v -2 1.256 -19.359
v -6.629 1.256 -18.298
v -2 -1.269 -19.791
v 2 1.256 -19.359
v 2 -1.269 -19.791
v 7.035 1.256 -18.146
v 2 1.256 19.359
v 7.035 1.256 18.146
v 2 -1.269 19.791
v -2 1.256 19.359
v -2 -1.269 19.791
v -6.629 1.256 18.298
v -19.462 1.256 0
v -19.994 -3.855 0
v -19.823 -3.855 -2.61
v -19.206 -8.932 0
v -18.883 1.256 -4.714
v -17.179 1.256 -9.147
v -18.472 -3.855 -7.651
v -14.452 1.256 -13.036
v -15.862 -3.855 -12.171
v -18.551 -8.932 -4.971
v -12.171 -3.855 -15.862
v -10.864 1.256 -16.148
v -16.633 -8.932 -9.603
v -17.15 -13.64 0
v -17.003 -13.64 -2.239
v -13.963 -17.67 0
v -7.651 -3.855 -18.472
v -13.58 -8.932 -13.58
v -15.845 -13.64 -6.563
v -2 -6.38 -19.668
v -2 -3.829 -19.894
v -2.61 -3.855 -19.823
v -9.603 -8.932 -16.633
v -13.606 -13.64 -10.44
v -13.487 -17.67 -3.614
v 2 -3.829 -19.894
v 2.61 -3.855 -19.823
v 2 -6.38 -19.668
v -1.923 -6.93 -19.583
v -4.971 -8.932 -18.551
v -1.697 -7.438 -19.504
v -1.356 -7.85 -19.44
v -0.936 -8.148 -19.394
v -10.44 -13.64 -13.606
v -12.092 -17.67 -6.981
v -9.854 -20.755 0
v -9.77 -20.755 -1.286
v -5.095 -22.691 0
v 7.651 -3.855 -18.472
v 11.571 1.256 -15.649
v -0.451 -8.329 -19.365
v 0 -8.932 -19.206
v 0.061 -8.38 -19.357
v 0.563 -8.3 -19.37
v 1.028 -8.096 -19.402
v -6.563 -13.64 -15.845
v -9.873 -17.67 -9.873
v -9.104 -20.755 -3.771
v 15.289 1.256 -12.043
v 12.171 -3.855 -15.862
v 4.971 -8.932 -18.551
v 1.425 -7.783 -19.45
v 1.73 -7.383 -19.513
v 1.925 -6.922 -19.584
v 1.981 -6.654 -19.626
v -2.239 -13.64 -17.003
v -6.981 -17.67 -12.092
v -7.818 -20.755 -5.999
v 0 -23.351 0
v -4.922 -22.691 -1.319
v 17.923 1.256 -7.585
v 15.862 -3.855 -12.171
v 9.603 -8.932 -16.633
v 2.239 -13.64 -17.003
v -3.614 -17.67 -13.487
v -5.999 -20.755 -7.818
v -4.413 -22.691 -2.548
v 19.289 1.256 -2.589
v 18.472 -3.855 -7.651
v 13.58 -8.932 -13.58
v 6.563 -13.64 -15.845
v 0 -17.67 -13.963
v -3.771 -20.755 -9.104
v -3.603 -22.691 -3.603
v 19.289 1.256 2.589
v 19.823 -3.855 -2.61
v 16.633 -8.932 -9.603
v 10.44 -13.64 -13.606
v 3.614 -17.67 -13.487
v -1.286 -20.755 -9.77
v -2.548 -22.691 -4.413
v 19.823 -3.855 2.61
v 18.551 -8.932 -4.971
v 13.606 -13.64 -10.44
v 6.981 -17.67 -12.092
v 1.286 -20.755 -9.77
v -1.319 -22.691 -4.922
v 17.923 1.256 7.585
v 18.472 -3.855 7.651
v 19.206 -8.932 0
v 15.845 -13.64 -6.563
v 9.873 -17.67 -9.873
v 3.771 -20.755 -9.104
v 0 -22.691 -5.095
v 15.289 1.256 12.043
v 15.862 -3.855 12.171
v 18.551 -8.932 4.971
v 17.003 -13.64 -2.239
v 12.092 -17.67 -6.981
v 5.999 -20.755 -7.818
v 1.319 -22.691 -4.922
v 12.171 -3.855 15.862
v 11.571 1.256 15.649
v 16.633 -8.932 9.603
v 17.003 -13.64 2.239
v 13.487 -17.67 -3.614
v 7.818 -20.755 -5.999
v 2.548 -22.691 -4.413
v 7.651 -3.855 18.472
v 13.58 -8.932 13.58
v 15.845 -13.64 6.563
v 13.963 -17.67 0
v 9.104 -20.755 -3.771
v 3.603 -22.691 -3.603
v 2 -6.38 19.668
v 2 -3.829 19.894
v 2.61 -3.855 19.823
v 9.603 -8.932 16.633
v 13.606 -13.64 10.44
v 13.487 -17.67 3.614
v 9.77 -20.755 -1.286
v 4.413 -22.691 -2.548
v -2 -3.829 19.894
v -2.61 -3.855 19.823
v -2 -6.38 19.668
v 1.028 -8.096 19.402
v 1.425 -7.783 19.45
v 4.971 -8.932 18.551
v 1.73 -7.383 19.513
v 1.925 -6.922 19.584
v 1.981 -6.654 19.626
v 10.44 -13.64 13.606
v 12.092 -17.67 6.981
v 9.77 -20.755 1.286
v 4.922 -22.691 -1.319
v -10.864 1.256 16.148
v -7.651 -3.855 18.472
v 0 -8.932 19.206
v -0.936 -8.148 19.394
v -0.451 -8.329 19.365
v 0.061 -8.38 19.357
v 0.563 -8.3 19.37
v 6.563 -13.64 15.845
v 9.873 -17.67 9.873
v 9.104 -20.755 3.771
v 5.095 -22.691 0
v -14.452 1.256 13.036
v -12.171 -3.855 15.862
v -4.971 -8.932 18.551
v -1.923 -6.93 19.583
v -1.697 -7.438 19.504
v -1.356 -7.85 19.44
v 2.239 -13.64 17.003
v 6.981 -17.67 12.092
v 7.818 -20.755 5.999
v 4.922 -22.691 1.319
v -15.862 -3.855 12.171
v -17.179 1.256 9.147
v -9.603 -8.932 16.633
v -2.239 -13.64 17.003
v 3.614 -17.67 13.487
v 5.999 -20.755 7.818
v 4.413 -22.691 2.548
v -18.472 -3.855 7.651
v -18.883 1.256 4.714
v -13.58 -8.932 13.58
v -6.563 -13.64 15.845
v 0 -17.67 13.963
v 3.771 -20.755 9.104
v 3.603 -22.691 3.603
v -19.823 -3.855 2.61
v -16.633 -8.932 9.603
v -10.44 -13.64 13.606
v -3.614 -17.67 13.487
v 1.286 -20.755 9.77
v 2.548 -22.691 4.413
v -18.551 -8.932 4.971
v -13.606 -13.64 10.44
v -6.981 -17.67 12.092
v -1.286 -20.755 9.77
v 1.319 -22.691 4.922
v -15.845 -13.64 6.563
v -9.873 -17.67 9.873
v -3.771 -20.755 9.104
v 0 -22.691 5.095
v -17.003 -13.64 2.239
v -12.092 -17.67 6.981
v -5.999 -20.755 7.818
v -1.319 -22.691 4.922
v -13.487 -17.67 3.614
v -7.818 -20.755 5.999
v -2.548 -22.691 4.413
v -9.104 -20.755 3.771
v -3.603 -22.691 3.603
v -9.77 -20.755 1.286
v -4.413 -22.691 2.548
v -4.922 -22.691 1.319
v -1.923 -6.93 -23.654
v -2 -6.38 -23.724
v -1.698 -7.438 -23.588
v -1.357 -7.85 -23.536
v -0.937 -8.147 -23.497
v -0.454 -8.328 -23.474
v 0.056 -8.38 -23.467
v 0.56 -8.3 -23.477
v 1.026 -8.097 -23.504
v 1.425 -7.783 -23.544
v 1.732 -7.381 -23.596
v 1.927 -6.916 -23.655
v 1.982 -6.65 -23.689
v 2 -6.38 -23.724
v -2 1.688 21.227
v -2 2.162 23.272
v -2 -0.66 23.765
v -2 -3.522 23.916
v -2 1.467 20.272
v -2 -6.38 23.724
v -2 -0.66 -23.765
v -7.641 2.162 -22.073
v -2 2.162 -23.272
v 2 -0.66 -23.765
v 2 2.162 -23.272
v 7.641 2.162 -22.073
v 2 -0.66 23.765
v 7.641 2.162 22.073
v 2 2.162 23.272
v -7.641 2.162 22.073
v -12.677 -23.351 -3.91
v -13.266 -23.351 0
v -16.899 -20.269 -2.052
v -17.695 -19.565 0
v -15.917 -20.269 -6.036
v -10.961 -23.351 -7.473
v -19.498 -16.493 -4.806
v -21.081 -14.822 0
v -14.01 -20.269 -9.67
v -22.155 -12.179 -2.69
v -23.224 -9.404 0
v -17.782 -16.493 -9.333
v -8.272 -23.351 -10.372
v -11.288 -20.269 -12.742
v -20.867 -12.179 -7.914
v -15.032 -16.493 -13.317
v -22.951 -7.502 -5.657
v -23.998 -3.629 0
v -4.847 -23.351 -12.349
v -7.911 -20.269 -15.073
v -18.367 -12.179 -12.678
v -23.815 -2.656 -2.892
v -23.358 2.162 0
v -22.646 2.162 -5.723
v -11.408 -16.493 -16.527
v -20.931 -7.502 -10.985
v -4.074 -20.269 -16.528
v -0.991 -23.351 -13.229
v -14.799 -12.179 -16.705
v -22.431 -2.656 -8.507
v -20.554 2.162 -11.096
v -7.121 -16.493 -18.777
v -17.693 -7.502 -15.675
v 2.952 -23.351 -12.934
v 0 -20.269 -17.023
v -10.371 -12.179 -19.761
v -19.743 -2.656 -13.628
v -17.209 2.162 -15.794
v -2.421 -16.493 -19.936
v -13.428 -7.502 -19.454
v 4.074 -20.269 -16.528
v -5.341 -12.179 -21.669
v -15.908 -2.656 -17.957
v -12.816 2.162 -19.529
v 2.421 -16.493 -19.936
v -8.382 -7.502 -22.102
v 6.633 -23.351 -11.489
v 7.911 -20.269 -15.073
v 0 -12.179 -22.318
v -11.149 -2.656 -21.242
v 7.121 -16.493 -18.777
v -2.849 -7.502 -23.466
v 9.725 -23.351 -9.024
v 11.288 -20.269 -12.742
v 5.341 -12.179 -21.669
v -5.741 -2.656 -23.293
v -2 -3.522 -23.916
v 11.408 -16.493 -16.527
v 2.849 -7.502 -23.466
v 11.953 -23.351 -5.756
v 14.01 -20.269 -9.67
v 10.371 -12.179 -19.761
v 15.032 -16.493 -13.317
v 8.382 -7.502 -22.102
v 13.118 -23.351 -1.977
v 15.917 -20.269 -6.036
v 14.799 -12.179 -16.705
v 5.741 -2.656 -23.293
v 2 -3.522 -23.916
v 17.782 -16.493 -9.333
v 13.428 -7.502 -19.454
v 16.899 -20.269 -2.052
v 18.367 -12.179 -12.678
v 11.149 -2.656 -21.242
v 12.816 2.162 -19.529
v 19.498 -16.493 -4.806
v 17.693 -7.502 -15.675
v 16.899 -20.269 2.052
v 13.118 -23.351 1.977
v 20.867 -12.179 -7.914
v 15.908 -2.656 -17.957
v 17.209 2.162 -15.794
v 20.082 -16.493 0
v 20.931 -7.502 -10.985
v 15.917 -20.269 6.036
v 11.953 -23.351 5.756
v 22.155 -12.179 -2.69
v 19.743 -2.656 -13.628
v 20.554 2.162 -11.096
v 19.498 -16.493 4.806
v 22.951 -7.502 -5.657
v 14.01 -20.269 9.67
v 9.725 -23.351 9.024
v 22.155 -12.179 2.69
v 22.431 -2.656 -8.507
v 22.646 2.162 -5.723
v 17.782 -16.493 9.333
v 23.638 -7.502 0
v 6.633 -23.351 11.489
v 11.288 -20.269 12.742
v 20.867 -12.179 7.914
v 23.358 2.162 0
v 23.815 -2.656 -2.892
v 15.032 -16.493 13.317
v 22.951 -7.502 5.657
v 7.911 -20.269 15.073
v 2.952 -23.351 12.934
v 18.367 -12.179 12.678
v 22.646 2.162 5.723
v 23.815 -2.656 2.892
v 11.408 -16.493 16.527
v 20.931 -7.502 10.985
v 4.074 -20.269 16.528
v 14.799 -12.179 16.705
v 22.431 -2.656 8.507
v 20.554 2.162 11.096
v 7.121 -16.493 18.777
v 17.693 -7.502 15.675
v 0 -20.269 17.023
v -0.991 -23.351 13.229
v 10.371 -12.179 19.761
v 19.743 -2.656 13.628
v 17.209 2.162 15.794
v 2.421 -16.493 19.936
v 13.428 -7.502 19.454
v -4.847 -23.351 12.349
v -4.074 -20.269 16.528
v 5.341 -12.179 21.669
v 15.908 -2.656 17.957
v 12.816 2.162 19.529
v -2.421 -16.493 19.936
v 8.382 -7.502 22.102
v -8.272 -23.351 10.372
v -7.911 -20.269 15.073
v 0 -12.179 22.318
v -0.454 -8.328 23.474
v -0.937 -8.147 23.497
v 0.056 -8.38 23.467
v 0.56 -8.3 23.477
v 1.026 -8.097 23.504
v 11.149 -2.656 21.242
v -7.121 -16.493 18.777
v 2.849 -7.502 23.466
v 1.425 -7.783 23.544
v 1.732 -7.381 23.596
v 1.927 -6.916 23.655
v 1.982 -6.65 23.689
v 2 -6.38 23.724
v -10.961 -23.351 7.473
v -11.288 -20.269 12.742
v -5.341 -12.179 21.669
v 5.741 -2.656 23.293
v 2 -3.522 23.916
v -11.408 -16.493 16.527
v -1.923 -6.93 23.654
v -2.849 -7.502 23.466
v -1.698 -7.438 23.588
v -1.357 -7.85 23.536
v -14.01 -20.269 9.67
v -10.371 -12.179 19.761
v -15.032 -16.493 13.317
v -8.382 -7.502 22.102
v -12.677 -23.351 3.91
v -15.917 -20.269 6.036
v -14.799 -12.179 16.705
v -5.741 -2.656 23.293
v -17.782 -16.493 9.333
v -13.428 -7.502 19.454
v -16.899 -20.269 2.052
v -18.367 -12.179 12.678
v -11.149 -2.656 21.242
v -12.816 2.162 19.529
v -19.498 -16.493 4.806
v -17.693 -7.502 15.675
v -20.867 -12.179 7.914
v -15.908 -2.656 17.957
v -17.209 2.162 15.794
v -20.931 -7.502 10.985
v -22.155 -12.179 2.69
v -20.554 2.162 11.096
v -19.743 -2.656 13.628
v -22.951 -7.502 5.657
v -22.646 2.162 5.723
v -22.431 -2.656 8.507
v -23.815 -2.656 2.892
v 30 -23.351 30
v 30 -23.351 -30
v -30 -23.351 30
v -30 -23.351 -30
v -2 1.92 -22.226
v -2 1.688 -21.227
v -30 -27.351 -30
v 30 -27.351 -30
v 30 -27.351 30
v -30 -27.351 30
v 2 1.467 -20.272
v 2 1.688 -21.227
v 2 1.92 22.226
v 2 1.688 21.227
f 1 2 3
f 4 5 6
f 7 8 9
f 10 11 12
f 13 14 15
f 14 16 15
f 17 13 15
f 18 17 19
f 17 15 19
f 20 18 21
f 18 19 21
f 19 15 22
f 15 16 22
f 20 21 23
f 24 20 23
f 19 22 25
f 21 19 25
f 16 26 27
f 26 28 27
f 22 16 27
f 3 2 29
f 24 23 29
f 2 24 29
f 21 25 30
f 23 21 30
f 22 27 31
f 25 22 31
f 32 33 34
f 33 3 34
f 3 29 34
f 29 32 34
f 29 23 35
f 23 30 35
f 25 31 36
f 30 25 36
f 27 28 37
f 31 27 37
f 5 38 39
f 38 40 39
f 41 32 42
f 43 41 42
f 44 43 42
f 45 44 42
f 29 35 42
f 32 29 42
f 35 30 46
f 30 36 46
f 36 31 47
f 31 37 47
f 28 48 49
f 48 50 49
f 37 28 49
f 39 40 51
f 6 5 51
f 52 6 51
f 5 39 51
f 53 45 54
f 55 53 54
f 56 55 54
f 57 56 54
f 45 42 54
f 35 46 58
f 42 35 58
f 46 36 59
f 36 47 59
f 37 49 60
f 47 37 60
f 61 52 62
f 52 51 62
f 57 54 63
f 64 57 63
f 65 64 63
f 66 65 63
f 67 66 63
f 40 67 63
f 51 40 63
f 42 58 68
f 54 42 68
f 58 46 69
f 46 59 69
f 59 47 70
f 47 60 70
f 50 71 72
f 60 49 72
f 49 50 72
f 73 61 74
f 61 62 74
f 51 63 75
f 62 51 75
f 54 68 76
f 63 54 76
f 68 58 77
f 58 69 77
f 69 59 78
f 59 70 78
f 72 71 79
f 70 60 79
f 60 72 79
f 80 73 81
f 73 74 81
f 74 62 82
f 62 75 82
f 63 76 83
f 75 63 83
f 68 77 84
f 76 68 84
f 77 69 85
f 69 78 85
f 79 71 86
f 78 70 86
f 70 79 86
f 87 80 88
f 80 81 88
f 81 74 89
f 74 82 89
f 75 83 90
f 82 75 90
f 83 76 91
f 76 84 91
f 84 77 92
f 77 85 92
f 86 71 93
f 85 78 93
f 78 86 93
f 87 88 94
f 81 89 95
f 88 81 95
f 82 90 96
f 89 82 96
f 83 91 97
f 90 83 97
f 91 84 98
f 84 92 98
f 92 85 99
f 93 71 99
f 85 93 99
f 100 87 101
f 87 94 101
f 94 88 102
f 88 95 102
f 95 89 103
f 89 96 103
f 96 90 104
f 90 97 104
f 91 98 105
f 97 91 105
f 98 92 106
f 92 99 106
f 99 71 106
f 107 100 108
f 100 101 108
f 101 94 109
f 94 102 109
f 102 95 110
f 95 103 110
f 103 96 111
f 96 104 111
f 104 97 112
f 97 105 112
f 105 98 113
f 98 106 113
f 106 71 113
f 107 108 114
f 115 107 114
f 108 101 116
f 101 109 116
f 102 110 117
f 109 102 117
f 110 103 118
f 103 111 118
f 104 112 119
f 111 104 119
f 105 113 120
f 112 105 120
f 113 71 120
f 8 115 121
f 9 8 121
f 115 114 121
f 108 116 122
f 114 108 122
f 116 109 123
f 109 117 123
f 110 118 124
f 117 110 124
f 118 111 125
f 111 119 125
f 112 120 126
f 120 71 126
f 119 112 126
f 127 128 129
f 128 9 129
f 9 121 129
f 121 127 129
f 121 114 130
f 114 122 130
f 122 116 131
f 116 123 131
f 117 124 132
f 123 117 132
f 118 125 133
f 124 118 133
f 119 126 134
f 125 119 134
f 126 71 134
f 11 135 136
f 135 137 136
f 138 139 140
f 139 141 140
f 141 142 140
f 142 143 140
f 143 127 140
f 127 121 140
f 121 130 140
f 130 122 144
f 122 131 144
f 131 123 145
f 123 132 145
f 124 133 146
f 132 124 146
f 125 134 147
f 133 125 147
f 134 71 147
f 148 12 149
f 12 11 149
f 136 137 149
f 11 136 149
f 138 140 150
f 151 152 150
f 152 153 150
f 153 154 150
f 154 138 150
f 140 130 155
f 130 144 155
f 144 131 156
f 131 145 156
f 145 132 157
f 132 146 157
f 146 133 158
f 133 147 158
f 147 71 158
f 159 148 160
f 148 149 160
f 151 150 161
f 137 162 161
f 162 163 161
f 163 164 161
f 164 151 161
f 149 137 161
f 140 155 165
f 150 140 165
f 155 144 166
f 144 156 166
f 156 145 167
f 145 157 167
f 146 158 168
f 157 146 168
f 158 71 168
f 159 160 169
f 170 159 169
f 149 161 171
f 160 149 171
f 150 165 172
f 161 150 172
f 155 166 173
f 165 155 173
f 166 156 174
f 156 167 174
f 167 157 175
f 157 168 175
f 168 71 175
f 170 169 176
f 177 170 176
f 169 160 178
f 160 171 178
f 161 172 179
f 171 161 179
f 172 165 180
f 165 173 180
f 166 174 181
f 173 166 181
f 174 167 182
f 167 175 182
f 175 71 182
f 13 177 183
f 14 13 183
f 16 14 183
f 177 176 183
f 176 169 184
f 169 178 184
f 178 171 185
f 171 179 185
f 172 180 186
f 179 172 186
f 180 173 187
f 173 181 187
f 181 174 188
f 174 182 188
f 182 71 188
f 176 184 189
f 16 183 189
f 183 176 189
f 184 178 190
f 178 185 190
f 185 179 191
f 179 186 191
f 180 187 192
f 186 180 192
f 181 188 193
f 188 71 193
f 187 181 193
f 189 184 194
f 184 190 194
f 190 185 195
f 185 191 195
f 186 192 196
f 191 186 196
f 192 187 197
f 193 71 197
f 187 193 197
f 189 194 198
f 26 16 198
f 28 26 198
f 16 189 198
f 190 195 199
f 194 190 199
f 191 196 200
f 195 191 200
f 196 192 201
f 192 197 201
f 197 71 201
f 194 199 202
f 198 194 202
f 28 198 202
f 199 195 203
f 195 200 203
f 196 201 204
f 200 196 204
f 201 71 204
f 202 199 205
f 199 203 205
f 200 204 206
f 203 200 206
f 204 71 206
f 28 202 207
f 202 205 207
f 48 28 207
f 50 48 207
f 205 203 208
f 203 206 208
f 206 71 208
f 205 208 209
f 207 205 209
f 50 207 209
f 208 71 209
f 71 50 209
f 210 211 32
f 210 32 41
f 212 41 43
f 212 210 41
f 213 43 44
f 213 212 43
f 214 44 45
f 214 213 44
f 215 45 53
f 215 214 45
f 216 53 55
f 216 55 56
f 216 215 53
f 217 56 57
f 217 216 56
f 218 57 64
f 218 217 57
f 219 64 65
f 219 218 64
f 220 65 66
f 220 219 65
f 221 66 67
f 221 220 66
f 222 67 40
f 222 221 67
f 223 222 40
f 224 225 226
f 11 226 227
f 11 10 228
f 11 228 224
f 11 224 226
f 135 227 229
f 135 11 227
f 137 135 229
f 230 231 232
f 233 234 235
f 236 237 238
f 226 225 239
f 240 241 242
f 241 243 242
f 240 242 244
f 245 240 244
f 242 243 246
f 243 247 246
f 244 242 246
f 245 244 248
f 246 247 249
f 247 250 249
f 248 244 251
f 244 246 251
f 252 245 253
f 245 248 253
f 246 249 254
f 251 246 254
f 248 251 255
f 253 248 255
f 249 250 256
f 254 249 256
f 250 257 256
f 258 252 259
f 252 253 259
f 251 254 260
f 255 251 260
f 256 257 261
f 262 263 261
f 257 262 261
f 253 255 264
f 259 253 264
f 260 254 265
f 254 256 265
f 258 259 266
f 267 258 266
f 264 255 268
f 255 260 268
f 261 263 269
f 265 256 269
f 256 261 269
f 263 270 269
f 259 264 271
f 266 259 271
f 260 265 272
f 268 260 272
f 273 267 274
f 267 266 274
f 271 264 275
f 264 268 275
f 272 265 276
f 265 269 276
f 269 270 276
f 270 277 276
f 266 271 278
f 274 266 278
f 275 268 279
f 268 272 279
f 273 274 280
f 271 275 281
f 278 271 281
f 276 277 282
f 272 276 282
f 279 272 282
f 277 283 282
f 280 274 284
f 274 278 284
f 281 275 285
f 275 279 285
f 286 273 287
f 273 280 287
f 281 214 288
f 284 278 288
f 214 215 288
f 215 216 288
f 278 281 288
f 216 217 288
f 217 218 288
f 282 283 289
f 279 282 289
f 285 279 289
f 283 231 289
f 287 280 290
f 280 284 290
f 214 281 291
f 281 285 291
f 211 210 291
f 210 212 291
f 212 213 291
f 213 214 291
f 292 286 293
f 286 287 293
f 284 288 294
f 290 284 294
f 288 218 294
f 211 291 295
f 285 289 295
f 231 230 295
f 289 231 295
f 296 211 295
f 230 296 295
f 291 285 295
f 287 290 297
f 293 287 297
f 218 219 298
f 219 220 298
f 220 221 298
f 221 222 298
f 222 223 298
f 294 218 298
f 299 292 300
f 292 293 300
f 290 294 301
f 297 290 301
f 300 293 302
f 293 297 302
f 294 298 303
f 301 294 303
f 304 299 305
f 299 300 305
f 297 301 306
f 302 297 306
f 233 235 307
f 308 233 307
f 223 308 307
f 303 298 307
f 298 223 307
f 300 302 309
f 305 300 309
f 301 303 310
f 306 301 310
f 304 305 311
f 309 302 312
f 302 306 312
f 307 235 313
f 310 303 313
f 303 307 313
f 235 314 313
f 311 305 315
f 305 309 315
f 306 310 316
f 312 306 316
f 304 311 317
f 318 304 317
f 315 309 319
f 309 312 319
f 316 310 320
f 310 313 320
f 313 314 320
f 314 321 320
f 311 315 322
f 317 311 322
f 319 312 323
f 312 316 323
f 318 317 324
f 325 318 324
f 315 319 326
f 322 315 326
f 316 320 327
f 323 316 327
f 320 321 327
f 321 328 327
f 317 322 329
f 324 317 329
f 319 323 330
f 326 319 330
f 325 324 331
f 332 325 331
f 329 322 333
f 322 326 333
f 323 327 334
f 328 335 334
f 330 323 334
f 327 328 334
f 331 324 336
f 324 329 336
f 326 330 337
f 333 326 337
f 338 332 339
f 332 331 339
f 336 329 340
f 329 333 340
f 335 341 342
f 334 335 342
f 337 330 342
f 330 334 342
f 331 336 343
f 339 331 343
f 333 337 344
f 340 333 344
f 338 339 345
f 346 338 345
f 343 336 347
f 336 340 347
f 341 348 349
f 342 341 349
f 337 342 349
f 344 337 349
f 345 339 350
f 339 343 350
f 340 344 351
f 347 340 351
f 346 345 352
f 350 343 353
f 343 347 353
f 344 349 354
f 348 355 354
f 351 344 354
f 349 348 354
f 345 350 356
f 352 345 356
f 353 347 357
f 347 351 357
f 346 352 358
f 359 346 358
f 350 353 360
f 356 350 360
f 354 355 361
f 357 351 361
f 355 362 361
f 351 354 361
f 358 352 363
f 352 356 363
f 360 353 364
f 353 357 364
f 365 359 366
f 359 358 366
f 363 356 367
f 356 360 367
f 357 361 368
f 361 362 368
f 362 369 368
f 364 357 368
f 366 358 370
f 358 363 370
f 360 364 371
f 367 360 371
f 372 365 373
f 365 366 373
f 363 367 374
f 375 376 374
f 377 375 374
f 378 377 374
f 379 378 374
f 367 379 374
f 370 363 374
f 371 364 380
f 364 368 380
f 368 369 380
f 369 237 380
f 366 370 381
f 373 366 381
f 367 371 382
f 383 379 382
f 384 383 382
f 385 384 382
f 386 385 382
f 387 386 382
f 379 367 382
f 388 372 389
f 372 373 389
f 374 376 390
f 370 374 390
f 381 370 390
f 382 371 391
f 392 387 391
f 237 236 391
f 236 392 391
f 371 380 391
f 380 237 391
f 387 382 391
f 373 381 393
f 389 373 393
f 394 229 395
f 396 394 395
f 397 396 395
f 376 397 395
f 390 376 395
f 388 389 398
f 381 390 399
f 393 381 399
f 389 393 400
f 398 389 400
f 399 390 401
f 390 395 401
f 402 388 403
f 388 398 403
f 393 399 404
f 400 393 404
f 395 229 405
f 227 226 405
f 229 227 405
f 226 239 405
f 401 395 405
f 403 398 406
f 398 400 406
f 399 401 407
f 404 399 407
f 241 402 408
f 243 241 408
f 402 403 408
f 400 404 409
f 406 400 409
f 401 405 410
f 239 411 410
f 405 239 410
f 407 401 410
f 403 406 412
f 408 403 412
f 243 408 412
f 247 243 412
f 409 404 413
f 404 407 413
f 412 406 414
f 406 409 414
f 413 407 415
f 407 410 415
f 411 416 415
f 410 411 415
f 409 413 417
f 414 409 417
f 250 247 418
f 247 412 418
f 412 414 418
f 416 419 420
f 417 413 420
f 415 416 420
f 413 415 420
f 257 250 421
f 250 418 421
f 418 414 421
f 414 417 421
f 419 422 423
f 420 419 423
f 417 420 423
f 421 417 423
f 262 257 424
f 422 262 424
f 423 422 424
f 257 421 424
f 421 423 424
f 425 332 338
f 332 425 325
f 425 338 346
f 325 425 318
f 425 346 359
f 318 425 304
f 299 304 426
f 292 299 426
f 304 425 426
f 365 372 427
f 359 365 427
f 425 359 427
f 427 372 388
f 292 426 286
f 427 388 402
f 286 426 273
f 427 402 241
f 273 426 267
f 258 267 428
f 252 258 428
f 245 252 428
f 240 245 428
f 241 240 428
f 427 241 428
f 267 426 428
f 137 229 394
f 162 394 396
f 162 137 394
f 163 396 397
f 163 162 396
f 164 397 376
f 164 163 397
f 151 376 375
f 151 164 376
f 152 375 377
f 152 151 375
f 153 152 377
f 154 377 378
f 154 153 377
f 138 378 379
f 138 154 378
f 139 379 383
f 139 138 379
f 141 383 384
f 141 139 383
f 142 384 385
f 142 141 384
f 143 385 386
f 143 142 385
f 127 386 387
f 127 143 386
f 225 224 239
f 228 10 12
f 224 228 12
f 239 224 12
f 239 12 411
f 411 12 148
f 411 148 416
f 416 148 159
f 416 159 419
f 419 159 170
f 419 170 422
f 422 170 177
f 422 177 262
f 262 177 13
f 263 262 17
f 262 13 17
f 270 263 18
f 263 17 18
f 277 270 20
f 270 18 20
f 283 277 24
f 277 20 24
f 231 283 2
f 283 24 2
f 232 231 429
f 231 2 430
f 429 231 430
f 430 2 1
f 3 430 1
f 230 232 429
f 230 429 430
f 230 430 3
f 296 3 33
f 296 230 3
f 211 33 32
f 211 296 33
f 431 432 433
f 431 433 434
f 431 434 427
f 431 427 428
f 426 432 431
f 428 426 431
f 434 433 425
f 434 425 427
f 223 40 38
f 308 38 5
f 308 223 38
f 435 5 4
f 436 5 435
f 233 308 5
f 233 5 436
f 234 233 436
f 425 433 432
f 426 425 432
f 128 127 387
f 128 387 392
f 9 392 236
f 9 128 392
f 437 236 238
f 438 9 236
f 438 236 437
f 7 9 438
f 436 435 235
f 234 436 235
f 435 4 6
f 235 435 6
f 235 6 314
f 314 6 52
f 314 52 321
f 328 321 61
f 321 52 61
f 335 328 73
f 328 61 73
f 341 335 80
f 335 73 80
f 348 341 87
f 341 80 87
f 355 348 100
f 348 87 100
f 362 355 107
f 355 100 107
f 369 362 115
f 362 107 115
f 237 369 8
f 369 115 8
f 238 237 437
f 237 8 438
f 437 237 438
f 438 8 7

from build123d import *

# Parameters (mm, degrees)
CUT_EXTRUDE1_DEPTH      = 44.589870827
CUT_EXTRUDE1_DEPTH_BACK = 44.589870827
SKETCH4_W               = 60
SKETCH4_H               = 60
BOSS_EXTRUDE1_DEPTH     = 4


with BuildPart() as part:
    # Sketch1 → Revolve1 (revolve)
    with BuildSketch(Plane.XY, mode=Mode.PRIVATE) as revolve1_sk:
        with BuildLine():
            Line((0, -23.350993377), (0, -27.350993377))
            ThreePointArc((0, -27.350993377), (18.81908657, -18.245354078), (23.358188619, 2.1621749))
            Line((23.358188619, 2.1621749), (19.462239628, 1.255657105))
            ThreePointArc((19.462239628, 1.255657105), (15.686507094, -15.757987178), (0, -23.350993377))
        make_face()
    revolve(revolve1_sk.sketch.rotate(Axis((0, 16.649006623, 0), (0, -1, 0)), 180), axis=Axis((0, 16.649006623, 0), (0, -1, 0)))

    # Sketch2 → Cut-Extrude1 (cut, two sides: drawn at the far end of the back side and taken through both)
    with BuildSketch(Plane.XY.offset(-CUT_EXTRUDE1_DEPTH_BACK)):
        with BuildLine():
            Line((0, 13.619569371), (-2, 13.619569371))
            Line((-2, 13.619569371), (-2, -6.380430629))
            ThreePointArc((-2, -6.380430629), (0, -8.380430629), (2, -6.380430629))
            Line((2, -6.380430629), (2, 13.619569371))
            Line((2, 13.619569371), (0, 13.619569371))
        make_face()
    extrude(amount=CUT_EXTRUDE1_DEPTH + CUT_EXTRUDE1_DEPTH_BACK, mode=Mode.SUBTRACT)

    # Sketch4 → Boss-Extrude1 (add)
    with BuildSketch(Plane(origin=(0, -27.350993377, 0), x_dir=(-1, 0, 0), z_dir=(0, -1, 0))):
        Rectangle(SKETCH4_W, SKETCH4_H)
    extrude(amount=-BOSS_EXTRUDE1_DEPTH)


solid = part.part
